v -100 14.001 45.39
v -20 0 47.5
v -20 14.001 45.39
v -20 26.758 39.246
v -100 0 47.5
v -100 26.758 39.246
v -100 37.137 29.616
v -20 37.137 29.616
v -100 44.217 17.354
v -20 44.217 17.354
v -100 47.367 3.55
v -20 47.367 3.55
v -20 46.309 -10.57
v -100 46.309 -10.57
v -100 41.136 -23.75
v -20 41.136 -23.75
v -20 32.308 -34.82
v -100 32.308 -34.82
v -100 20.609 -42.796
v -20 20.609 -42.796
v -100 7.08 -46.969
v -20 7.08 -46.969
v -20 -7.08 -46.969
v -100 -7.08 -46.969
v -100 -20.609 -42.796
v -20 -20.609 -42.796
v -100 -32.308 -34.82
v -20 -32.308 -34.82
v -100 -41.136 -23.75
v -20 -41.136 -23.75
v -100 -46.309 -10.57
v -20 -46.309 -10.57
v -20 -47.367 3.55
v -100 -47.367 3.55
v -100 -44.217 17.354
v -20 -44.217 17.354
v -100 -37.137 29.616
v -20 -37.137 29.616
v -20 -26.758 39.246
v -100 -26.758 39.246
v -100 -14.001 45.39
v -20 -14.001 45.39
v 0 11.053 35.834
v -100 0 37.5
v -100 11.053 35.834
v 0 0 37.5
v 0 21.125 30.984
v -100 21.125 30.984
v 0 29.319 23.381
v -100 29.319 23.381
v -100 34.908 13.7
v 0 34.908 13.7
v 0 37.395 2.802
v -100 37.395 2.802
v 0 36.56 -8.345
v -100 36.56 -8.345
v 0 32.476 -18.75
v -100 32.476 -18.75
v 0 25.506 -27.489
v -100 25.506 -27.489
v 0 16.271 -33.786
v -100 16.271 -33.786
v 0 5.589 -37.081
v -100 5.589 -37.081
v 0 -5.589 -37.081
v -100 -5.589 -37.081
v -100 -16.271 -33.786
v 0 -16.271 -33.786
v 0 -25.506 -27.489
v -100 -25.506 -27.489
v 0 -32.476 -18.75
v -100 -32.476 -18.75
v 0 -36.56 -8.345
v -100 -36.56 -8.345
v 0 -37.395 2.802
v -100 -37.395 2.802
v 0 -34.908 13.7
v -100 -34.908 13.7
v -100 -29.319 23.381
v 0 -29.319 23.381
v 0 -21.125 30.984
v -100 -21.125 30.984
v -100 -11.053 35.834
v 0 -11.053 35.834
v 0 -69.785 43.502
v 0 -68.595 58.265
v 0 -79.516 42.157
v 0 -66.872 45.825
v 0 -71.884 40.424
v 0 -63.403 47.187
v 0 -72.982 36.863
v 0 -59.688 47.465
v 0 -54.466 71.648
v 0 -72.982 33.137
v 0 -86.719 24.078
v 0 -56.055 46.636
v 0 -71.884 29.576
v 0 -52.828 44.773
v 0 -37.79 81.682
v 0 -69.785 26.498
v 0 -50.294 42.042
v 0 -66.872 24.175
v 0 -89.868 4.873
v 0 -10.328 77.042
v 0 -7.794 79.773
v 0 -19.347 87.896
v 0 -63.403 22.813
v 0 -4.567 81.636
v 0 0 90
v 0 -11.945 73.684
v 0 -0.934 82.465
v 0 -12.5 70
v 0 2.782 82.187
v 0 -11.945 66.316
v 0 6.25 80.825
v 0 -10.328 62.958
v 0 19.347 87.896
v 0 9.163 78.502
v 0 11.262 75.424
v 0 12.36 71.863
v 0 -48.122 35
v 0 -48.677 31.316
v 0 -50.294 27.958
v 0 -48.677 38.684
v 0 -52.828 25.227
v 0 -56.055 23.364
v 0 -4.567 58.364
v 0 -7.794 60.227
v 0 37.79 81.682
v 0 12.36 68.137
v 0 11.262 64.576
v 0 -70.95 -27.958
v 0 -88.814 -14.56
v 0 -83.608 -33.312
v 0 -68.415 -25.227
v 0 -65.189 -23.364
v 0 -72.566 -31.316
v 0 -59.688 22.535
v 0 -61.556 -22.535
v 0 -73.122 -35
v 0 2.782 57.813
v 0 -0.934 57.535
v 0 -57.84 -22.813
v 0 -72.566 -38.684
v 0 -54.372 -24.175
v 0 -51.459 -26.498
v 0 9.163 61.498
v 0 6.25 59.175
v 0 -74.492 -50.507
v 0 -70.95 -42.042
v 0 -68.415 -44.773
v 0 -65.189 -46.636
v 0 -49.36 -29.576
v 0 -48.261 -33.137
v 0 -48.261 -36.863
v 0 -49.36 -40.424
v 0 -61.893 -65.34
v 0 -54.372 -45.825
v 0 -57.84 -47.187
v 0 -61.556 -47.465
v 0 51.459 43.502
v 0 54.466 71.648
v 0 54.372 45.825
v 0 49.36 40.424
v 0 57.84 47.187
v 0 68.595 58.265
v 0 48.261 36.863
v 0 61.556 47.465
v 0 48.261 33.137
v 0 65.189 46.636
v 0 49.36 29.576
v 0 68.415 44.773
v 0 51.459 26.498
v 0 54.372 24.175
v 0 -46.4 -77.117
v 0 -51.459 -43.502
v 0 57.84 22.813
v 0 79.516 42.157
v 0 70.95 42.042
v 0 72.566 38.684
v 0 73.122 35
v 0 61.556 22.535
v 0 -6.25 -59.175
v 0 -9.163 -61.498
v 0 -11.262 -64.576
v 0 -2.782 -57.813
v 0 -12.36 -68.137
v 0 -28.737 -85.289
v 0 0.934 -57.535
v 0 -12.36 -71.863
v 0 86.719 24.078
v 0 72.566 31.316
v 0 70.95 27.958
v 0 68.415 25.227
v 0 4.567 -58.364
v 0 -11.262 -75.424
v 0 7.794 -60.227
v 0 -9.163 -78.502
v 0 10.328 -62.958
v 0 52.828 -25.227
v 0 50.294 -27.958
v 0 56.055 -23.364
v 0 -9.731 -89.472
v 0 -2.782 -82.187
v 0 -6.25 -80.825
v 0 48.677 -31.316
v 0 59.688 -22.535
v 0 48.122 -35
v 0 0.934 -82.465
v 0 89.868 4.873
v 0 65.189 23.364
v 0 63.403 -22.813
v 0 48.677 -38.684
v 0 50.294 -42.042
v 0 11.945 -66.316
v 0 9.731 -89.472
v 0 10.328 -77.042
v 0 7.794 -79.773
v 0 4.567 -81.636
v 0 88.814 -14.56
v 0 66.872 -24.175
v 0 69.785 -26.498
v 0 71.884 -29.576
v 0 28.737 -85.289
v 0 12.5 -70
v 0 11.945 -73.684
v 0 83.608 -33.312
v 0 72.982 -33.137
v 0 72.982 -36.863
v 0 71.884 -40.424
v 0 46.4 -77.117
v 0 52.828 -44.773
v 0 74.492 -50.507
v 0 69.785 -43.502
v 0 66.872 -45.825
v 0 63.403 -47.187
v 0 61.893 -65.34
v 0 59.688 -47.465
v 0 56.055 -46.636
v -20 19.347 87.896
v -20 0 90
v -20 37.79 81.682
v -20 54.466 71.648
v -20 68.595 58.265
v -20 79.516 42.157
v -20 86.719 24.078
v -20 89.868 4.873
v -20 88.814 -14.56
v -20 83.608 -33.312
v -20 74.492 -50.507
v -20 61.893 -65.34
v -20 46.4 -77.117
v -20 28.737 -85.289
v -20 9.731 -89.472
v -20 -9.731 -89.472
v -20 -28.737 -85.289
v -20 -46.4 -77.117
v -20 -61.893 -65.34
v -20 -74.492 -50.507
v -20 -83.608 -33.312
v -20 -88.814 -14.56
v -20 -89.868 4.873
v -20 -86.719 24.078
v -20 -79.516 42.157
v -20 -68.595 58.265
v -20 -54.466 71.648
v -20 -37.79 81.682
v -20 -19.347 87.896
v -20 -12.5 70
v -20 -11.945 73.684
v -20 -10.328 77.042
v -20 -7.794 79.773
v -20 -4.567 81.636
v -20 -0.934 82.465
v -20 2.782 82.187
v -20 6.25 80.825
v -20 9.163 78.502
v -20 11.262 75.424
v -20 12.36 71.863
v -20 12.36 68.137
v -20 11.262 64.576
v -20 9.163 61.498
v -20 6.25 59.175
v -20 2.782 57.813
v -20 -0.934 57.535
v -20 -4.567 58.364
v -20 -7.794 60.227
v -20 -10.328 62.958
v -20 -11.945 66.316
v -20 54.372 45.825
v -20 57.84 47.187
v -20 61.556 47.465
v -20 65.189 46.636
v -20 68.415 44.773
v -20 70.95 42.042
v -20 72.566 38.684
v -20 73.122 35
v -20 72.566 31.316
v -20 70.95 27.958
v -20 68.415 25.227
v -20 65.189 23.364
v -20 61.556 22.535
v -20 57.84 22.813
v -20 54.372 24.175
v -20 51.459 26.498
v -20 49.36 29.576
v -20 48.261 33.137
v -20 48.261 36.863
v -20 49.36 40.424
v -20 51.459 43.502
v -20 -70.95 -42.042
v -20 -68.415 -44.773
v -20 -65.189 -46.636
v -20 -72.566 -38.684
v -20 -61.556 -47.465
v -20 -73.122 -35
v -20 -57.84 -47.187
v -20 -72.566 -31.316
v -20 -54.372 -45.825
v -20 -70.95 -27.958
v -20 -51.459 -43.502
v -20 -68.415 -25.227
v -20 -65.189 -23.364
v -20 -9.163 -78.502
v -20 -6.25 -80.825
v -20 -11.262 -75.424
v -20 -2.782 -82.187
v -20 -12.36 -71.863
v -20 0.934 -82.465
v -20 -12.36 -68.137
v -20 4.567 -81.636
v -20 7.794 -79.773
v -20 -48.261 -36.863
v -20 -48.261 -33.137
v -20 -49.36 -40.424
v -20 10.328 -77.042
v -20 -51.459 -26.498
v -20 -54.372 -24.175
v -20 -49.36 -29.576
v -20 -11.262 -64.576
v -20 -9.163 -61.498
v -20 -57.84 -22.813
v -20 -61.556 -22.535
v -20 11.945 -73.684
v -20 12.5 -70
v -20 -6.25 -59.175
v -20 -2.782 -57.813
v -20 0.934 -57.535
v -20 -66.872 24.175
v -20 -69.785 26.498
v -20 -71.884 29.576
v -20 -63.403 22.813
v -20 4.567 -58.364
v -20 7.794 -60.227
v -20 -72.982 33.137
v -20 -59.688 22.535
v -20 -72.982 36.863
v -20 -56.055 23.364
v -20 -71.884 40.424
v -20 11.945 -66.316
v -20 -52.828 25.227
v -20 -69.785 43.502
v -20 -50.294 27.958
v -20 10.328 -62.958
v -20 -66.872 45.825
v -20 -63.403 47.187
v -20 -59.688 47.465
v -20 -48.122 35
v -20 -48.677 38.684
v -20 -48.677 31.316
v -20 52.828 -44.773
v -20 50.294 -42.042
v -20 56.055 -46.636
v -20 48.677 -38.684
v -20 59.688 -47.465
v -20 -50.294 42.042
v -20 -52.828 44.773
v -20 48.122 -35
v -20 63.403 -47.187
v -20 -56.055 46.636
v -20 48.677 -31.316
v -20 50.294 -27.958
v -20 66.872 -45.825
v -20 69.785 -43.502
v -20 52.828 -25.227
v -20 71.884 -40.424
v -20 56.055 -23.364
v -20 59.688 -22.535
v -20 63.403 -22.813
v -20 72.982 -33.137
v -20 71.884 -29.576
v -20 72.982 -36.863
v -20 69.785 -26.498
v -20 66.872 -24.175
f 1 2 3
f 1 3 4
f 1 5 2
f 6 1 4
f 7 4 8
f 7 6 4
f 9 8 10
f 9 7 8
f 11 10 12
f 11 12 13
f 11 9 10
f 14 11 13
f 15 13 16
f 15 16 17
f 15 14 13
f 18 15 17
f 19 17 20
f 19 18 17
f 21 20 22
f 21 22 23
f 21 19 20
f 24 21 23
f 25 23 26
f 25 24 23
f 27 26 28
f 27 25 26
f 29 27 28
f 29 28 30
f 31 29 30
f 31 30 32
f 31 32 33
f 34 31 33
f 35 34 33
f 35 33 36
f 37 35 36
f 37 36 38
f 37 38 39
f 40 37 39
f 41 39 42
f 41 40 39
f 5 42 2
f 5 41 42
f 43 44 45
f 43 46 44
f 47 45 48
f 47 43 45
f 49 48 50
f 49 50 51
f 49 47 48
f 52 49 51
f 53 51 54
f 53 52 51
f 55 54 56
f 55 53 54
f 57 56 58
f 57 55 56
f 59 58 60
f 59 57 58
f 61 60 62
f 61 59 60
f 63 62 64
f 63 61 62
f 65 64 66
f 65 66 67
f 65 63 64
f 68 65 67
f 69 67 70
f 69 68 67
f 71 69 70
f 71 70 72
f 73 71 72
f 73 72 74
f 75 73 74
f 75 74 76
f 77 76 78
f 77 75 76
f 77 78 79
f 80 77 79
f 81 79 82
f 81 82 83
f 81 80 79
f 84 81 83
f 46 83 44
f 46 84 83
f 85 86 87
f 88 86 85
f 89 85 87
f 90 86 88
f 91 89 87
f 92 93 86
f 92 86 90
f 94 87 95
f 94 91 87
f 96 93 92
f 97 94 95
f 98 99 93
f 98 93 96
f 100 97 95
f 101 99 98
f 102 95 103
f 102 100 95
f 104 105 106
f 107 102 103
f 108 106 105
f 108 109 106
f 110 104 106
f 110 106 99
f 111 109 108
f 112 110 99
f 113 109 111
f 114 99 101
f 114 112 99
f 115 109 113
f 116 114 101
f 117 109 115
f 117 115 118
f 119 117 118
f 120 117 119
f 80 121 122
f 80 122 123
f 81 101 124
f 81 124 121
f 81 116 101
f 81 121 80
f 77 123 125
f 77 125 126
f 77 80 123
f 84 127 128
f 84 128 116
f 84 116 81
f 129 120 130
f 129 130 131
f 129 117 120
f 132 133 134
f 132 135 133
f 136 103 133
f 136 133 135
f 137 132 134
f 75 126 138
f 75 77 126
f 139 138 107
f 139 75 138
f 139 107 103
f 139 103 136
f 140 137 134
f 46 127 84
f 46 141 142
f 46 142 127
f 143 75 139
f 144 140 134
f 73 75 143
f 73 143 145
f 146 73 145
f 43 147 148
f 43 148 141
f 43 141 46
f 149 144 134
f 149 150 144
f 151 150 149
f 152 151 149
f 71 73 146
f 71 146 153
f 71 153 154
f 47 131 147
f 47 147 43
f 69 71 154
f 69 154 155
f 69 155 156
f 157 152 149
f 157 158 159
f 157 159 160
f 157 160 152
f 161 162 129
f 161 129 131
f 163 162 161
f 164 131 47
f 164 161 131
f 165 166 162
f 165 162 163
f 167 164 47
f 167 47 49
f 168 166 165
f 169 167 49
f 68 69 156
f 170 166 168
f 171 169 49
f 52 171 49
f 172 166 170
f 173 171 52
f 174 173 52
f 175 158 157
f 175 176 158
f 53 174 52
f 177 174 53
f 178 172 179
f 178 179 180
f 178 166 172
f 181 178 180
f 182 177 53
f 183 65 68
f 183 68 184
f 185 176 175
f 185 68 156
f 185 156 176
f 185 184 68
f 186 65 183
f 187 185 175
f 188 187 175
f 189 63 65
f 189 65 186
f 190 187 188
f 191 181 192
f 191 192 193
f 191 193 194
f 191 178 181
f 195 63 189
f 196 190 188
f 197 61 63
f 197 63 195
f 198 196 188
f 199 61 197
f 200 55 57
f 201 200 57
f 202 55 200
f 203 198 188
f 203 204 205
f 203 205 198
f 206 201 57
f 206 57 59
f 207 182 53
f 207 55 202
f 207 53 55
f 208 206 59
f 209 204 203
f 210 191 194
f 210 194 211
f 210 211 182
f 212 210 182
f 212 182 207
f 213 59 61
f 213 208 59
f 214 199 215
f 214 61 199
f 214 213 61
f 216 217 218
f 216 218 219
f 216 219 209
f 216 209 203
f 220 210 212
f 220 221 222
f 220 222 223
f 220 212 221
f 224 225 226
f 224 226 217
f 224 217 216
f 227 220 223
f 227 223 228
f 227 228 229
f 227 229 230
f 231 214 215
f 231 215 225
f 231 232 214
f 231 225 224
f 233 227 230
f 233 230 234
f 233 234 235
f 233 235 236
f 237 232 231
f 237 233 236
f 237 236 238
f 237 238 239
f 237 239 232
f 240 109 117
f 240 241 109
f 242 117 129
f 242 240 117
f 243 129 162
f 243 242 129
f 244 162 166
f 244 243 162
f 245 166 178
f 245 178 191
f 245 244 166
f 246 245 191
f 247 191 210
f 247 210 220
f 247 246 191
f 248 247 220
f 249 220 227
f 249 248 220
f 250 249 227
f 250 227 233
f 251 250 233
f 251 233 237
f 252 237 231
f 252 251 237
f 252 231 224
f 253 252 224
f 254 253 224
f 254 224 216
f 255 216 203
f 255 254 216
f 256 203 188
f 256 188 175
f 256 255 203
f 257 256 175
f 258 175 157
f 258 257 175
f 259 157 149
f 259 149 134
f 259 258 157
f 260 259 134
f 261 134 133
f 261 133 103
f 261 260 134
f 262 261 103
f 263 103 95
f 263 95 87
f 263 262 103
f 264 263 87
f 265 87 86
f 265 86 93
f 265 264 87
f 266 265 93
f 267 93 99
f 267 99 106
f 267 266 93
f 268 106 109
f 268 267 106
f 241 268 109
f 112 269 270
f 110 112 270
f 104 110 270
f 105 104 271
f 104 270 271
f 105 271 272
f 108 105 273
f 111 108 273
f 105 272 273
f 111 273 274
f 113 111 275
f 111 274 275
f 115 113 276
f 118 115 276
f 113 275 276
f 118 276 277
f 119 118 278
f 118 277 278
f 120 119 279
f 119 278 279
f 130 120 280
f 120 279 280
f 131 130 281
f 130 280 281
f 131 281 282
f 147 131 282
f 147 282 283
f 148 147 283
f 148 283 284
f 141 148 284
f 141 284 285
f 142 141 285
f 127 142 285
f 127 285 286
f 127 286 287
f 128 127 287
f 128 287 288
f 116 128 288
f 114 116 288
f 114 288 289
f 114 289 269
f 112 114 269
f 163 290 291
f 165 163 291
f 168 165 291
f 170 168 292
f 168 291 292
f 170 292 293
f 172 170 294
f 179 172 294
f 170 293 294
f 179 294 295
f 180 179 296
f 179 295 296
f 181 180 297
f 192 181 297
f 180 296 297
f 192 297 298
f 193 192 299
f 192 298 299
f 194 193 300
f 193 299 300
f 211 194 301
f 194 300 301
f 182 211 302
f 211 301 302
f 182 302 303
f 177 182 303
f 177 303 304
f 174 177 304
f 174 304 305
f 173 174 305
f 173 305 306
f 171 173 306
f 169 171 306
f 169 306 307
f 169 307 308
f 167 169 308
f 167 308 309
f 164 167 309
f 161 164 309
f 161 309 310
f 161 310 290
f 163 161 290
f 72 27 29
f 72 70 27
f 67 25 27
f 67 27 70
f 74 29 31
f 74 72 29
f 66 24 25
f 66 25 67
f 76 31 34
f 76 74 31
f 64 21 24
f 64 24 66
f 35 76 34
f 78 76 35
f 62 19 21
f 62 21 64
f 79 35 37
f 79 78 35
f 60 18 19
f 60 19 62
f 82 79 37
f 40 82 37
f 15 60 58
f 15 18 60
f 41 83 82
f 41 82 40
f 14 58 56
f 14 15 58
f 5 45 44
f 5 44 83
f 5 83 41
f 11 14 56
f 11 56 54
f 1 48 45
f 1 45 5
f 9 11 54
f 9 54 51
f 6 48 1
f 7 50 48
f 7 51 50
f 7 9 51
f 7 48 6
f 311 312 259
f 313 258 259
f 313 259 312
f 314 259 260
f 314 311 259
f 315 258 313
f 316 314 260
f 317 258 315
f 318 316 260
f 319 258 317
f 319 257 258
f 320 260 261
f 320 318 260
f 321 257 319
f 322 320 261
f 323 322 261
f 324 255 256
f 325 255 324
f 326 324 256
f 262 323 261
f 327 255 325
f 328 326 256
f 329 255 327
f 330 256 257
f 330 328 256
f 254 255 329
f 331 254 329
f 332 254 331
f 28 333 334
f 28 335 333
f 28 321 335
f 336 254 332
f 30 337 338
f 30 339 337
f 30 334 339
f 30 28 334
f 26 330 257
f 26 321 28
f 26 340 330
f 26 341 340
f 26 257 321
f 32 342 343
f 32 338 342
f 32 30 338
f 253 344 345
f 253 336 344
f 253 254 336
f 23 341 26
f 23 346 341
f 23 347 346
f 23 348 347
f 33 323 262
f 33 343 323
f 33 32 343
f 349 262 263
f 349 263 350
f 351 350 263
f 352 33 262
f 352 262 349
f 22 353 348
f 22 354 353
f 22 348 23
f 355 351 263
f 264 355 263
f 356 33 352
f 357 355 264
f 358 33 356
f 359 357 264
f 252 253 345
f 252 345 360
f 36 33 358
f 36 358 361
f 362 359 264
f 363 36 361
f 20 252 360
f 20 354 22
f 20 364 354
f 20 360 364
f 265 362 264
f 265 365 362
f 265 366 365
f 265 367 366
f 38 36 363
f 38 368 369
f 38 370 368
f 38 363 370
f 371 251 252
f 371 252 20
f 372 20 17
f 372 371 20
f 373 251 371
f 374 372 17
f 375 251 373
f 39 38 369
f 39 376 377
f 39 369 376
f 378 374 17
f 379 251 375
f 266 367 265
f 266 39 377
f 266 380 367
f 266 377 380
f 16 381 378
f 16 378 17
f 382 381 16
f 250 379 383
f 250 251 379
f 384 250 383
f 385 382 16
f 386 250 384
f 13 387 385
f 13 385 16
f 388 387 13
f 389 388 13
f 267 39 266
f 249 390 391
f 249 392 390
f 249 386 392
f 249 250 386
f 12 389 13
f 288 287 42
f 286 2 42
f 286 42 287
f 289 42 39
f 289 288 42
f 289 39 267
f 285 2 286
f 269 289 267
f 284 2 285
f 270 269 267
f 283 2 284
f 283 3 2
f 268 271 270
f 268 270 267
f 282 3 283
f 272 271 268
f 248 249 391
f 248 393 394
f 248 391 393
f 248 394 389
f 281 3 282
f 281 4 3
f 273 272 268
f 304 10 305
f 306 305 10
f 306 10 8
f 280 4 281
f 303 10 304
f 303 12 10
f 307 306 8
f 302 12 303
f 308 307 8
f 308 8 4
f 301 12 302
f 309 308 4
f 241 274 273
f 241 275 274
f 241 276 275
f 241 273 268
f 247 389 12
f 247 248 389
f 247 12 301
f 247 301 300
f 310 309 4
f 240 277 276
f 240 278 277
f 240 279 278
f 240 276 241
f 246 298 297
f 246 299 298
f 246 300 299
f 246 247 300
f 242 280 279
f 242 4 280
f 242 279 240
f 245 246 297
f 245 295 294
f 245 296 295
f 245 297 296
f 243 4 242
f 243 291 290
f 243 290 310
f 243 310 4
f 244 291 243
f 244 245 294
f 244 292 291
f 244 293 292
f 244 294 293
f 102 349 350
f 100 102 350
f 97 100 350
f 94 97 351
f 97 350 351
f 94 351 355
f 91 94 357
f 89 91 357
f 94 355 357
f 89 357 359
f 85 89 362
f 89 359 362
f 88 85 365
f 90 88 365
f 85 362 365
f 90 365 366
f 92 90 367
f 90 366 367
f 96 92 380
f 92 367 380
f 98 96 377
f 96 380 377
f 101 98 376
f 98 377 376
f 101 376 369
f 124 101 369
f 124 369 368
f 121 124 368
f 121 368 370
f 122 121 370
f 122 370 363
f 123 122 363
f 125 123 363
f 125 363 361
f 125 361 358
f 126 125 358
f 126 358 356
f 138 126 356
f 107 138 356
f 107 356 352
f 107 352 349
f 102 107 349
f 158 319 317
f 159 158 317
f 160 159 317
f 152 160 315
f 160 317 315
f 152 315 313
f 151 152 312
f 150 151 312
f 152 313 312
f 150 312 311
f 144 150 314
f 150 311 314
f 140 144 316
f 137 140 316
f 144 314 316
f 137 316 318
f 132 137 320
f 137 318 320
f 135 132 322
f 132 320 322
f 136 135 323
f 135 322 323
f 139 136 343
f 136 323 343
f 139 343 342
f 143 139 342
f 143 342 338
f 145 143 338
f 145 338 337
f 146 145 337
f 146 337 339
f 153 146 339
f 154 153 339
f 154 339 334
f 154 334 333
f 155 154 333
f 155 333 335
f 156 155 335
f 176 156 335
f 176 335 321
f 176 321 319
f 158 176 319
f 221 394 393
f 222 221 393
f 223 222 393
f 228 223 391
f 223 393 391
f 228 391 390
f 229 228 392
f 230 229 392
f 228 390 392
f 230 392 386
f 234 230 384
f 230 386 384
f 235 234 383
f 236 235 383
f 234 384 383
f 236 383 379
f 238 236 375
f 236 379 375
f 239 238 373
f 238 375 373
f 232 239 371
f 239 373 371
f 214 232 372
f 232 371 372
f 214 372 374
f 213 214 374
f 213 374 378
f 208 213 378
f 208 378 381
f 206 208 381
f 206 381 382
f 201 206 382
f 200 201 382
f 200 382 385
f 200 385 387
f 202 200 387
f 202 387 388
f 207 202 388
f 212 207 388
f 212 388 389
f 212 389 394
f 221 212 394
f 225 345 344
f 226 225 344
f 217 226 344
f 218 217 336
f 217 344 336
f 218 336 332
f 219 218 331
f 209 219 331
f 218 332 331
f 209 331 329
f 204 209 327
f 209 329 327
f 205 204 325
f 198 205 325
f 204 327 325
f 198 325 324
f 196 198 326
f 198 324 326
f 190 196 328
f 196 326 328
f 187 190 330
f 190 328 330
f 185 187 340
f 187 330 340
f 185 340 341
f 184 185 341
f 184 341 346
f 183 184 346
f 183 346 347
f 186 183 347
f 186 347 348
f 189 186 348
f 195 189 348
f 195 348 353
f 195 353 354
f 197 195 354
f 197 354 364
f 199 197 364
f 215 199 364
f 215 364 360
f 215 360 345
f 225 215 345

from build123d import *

# Parameters (mm, degrees)
F2_R            = 12.5
F3_DEPTH        = 20.001
F3_COPIES_COUNT = 6


# Not quite as in the source:
# - a pattern or mirror of a feature is missing from the dataset's text; its kind, count and spacing are read off the source's solid


with BuildPart() as f1:
    # F0 (on Front) → F1 (revolve)
    with BuildSketch(Plane.XZ):
        Polygon((-100, 37.5), (0, 37.5), (0, 90), (-20, 90), (-20, 47.5), (-100, 47.5), align=None)
    revolve(axis=Axis((-107.4553492388, 0, 0), (-1, 0, 0)))

    # F2 (on face) → F3 (cut, through all)
    with BuildSketch(Plane(origin=(-20, 0, 0), x_dir=(0, -1, 0), z_dir=(-1, 0, 0))):
        with Locations((0, 70)):
            Circle(F2_R)
    f3 = extrude(amount=-F3_DEPTH, mode=Mode.SUBTRACT)

    # F3_copies: F3 ×6 about axis
    f3_copies_axis = Axis((0, 0, 0), (1, 0, 0))
    for i in range(1, F3_COPIES_COUNT):
        add(f3.rotate(f3_copies_axis, i * 360 / F3_COPIES_COUNT), mode=Mode.SUBTRACT)


solid = f1.part
